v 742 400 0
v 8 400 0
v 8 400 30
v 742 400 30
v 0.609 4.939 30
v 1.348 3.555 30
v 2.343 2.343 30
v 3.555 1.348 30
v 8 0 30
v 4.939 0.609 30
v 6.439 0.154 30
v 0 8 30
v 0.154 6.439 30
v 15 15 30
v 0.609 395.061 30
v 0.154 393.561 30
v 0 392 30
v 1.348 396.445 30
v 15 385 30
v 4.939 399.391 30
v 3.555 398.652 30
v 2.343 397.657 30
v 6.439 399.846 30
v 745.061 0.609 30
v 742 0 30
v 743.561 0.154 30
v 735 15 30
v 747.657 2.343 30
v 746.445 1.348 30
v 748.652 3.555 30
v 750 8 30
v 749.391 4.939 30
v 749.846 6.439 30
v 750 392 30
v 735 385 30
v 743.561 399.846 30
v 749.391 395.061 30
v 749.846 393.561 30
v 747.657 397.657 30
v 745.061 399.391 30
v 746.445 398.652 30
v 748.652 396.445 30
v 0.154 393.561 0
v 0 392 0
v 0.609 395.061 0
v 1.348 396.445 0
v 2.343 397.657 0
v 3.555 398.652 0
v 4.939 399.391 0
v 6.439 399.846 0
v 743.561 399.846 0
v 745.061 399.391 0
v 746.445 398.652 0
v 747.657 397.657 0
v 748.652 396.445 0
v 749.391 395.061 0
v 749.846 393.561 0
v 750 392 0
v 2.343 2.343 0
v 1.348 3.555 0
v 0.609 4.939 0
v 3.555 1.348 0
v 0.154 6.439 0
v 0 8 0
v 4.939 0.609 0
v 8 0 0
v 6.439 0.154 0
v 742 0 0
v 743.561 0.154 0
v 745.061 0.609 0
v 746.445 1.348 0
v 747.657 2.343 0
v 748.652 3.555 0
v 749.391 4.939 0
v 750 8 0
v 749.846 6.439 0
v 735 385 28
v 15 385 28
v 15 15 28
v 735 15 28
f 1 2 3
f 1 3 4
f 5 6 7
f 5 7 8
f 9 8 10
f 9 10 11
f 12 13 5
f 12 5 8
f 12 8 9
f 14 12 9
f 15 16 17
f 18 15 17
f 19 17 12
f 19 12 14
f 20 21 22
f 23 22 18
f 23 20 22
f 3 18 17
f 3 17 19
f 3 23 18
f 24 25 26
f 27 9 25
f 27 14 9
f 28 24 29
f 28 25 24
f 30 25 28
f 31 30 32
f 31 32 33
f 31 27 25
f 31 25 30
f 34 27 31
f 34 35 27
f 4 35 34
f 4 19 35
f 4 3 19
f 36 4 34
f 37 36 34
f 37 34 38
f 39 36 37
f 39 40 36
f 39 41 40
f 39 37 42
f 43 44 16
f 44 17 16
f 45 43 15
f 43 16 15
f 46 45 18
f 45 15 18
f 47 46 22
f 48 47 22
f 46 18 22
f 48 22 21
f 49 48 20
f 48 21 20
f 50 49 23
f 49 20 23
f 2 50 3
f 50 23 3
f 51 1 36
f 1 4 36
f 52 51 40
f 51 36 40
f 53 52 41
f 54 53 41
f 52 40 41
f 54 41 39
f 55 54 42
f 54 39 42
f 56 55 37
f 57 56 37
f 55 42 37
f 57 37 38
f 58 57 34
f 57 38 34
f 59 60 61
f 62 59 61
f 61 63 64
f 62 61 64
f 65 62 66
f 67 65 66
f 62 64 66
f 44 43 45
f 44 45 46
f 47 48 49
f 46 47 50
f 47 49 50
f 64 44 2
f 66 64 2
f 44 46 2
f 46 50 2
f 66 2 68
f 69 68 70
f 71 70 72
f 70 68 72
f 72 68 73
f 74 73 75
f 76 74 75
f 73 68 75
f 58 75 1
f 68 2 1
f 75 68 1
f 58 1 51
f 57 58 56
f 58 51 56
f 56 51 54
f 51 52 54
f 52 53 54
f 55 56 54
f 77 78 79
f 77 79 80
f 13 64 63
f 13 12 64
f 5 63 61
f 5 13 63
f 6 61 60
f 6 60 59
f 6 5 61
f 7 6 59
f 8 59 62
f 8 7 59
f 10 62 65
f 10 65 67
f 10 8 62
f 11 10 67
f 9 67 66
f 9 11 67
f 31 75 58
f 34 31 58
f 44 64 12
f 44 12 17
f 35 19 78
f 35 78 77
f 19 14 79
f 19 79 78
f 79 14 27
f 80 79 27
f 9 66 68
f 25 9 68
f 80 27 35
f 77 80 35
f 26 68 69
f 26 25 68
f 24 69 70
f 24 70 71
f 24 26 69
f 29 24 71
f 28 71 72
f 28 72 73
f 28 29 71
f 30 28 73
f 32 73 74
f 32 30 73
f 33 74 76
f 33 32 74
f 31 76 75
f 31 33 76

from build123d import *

# Parameters (mm, degrees)
CROQUIS1_W              = 750
CROQUIS1_H              = 400
SALIENTE_EXTRUIR1_DEPTH = 30
CROQUIS2_W              = 720
CROQUIS2_H              = 370
CORTAR_EXTRUIR1_DEPTH   = 2
REDONDEO1_R             = 8


with BuildPart() as part:
    # Croquis1 → Saliente-Extruir1 (new body)
    with BuildSketch(Plane.XY):
        with Locations((375, 200)):
            Rectangle(CROQUIS1_W, CROQUIS1_H)
    extrude(amount=SALIENTE_EXTRUIR1_DEPTH)

    # Croquis2 → Cortar-Extruir1 (cut)
    with BuildSketch(Plane.XY.offset(30)):
        with Locations((375, 200)):
            Rectangle(CROQUIS2_W, CROQUIS2_H)
    extrude(amount=-CORTAR_EXTRUIR1_DEPTH, mode=Mode.SUBTRACT)

    # Redondeo1
    redondeo1_edges = [part.edges().sort_by_distance(p)[0] for p in [
        (0, 400, 15),
        (750, 400, 15),
        (750, 0, 15),
        (0, 0, 15),
    ]]
    fillet(redondeo1_edges, radius=REDONDEO1_R)


solid = part.part
